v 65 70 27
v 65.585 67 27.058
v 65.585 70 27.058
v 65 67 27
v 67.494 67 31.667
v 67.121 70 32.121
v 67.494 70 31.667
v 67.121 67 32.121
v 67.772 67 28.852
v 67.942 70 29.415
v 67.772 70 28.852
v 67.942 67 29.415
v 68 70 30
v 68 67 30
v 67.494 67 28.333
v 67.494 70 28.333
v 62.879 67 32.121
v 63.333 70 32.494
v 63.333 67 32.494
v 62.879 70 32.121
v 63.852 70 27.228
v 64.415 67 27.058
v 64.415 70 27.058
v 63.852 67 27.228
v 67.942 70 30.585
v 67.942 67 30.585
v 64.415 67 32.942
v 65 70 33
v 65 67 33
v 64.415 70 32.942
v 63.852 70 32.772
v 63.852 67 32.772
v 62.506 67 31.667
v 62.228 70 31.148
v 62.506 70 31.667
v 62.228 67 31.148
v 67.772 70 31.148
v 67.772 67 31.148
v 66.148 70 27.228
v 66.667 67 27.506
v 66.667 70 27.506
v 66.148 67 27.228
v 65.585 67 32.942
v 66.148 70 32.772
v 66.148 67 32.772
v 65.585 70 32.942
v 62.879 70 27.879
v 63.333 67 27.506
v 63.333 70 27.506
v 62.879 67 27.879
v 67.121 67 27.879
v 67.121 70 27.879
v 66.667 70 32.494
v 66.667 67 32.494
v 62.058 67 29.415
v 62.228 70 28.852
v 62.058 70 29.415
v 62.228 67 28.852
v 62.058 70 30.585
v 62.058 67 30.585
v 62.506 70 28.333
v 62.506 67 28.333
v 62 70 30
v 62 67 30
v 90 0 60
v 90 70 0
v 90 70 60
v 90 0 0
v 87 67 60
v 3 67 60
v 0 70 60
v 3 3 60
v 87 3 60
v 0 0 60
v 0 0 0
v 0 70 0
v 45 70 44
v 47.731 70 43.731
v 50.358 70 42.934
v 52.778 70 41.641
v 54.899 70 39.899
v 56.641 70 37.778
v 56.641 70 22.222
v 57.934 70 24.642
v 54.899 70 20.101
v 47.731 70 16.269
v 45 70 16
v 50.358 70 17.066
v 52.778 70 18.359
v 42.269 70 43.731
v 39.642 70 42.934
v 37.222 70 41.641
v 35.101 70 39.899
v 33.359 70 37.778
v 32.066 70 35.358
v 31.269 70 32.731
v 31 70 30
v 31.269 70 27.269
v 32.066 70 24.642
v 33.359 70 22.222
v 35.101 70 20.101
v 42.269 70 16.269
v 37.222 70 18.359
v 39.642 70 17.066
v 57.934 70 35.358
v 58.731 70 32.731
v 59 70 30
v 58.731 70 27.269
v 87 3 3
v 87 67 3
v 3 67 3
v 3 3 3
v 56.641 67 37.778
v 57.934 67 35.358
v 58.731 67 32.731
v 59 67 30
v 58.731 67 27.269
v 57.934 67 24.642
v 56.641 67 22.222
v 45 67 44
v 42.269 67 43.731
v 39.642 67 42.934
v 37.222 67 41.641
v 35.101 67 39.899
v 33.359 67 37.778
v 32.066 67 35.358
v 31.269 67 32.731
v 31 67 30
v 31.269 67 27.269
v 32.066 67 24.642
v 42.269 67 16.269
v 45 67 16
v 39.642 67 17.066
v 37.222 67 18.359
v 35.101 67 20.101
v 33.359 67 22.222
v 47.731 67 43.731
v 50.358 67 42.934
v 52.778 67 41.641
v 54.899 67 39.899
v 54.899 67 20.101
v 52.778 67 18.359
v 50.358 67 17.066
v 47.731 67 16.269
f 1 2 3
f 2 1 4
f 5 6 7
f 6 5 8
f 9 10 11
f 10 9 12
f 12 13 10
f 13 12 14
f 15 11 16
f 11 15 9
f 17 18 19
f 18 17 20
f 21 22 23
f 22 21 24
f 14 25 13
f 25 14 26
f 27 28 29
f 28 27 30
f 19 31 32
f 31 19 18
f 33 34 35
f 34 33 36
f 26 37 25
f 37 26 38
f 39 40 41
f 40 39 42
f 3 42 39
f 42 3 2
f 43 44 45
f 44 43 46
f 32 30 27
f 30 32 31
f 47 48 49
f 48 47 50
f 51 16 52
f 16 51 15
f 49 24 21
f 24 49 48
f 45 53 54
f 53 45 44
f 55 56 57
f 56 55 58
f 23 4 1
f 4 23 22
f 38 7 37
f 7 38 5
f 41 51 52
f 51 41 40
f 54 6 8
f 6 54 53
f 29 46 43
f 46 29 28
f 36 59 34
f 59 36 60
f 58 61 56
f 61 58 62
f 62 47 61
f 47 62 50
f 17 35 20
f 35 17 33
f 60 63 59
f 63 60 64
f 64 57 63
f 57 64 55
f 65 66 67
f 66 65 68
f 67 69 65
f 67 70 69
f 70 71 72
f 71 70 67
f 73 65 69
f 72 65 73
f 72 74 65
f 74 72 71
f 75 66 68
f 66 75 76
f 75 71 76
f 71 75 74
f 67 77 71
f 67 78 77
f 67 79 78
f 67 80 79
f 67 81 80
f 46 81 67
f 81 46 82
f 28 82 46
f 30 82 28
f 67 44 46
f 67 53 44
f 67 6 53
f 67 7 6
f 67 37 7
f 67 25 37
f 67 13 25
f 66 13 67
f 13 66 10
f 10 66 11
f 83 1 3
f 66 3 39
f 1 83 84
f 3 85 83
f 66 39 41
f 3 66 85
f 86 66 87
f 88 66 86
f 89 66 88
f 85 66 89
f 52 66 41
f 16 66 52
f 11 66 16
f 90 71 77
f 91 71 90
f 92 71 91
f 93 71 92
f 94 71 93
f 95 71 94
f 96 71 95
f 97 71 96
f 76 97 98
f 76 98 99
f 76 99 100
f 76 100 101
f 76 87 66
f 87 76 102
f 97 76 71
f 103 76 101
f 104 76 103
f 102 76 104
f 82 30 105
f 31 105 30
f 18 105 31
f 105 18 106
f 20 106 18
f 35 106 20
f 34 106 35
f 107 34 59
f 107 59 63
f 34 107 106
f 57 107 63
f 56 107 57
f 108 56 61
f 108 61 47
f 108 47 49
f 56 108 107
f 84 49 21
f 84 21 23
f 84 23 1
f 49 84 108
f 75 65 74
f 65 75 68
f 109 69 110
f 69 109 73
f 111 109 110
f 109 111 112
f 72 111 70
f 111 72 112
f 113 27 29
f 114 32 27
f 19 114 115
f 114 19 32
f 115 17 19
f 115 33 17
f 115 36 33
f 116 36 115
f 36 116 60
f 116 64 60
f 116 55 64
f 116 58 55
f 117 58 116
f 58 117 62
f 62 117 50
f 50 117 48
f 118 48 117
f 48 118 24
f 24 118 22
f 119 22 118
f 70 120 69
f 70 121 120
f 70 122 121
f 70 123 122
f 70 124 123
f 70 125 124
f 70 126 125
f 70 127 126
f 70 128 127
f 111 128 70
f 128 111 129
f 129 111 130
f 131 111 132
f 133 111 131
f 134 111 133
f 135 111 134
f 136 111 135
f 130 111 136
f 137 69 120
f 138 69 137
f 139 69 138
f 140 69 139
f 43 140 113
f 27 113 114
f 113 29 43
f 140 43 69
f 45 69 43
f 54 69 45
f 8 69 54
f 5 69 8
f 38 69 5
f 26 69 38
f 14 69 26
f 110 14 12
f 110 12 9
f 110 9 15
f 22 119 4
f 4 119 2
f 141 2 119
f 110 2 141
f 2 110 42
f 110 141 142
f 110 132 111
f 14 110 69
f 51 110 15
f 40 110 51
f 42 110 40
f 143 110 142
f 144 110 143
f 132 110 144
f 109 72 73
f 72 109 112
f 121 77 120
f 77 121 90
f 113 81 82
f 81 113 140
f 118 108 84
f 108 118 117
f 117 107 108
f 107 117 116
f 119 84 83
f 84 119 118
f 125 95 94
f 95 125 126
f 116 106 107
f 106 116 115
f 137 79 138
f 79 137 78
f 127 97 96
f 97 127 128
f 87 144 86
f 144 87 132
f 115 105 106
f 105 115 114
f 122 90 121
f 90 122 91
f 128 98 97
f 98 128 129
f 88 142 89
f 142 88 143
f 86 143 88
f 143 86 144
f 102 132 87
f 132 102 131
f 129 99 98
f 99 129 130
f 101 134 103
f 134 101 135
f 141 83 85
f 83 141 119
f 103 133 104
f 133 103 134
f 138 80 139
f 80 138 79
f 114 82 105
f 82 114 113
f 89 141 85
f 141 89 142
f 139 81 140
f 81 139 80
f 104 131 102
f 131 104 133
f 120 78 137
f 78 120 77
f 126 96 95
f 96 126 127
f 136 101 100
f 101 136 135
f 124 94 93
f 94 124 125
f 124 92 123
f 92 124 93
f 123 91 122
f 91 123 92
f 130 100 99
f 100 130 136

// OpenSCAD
$fn = 32;

// ----------------------------------------------------------------------
// Vent box: roundvent enclosure
// ----------------------------------------------------------------------

// --- parameters (mm) ---
box_l = 90;               // box length, X
box_w = 70;               // box width, Y
box_h = 60;               // box height, Z
wall_t = 3;               // shell wall thickness
vent_d = 28;              // central vent diameter
ring_d = 6;               // ring hole diameter
n_ring = 8;               // holes in the ring
ring_r = 20;              // ring radius

ring_step = 360 / n_ring;  // ring hole angular step

difference() {
  cube([box_l, box_w, box_h]);
  translate([wall_t, wall_t, wall_t])
    cube([box_l - 2 * wall_t, box_w - 2 * wall_t, box_h]);
  translate([box_l / 2, box_w - wall_t - 1, box_h / 2])
    rotate([-90, 0, 0]) cylinder(h = wall_t + 2, d = vent_d);
  for (i = [0 : n_ring - 1])
    translate([box_l / 2, box_w - wall_t - 1, box_h / 2])
      rotate([0, 0, i * ring_step])
        translate([ring_r, 0, 0]) rotate([-90, 0, 0])
          cylinder(h = wall_t + 2, d = ring_d);
}
